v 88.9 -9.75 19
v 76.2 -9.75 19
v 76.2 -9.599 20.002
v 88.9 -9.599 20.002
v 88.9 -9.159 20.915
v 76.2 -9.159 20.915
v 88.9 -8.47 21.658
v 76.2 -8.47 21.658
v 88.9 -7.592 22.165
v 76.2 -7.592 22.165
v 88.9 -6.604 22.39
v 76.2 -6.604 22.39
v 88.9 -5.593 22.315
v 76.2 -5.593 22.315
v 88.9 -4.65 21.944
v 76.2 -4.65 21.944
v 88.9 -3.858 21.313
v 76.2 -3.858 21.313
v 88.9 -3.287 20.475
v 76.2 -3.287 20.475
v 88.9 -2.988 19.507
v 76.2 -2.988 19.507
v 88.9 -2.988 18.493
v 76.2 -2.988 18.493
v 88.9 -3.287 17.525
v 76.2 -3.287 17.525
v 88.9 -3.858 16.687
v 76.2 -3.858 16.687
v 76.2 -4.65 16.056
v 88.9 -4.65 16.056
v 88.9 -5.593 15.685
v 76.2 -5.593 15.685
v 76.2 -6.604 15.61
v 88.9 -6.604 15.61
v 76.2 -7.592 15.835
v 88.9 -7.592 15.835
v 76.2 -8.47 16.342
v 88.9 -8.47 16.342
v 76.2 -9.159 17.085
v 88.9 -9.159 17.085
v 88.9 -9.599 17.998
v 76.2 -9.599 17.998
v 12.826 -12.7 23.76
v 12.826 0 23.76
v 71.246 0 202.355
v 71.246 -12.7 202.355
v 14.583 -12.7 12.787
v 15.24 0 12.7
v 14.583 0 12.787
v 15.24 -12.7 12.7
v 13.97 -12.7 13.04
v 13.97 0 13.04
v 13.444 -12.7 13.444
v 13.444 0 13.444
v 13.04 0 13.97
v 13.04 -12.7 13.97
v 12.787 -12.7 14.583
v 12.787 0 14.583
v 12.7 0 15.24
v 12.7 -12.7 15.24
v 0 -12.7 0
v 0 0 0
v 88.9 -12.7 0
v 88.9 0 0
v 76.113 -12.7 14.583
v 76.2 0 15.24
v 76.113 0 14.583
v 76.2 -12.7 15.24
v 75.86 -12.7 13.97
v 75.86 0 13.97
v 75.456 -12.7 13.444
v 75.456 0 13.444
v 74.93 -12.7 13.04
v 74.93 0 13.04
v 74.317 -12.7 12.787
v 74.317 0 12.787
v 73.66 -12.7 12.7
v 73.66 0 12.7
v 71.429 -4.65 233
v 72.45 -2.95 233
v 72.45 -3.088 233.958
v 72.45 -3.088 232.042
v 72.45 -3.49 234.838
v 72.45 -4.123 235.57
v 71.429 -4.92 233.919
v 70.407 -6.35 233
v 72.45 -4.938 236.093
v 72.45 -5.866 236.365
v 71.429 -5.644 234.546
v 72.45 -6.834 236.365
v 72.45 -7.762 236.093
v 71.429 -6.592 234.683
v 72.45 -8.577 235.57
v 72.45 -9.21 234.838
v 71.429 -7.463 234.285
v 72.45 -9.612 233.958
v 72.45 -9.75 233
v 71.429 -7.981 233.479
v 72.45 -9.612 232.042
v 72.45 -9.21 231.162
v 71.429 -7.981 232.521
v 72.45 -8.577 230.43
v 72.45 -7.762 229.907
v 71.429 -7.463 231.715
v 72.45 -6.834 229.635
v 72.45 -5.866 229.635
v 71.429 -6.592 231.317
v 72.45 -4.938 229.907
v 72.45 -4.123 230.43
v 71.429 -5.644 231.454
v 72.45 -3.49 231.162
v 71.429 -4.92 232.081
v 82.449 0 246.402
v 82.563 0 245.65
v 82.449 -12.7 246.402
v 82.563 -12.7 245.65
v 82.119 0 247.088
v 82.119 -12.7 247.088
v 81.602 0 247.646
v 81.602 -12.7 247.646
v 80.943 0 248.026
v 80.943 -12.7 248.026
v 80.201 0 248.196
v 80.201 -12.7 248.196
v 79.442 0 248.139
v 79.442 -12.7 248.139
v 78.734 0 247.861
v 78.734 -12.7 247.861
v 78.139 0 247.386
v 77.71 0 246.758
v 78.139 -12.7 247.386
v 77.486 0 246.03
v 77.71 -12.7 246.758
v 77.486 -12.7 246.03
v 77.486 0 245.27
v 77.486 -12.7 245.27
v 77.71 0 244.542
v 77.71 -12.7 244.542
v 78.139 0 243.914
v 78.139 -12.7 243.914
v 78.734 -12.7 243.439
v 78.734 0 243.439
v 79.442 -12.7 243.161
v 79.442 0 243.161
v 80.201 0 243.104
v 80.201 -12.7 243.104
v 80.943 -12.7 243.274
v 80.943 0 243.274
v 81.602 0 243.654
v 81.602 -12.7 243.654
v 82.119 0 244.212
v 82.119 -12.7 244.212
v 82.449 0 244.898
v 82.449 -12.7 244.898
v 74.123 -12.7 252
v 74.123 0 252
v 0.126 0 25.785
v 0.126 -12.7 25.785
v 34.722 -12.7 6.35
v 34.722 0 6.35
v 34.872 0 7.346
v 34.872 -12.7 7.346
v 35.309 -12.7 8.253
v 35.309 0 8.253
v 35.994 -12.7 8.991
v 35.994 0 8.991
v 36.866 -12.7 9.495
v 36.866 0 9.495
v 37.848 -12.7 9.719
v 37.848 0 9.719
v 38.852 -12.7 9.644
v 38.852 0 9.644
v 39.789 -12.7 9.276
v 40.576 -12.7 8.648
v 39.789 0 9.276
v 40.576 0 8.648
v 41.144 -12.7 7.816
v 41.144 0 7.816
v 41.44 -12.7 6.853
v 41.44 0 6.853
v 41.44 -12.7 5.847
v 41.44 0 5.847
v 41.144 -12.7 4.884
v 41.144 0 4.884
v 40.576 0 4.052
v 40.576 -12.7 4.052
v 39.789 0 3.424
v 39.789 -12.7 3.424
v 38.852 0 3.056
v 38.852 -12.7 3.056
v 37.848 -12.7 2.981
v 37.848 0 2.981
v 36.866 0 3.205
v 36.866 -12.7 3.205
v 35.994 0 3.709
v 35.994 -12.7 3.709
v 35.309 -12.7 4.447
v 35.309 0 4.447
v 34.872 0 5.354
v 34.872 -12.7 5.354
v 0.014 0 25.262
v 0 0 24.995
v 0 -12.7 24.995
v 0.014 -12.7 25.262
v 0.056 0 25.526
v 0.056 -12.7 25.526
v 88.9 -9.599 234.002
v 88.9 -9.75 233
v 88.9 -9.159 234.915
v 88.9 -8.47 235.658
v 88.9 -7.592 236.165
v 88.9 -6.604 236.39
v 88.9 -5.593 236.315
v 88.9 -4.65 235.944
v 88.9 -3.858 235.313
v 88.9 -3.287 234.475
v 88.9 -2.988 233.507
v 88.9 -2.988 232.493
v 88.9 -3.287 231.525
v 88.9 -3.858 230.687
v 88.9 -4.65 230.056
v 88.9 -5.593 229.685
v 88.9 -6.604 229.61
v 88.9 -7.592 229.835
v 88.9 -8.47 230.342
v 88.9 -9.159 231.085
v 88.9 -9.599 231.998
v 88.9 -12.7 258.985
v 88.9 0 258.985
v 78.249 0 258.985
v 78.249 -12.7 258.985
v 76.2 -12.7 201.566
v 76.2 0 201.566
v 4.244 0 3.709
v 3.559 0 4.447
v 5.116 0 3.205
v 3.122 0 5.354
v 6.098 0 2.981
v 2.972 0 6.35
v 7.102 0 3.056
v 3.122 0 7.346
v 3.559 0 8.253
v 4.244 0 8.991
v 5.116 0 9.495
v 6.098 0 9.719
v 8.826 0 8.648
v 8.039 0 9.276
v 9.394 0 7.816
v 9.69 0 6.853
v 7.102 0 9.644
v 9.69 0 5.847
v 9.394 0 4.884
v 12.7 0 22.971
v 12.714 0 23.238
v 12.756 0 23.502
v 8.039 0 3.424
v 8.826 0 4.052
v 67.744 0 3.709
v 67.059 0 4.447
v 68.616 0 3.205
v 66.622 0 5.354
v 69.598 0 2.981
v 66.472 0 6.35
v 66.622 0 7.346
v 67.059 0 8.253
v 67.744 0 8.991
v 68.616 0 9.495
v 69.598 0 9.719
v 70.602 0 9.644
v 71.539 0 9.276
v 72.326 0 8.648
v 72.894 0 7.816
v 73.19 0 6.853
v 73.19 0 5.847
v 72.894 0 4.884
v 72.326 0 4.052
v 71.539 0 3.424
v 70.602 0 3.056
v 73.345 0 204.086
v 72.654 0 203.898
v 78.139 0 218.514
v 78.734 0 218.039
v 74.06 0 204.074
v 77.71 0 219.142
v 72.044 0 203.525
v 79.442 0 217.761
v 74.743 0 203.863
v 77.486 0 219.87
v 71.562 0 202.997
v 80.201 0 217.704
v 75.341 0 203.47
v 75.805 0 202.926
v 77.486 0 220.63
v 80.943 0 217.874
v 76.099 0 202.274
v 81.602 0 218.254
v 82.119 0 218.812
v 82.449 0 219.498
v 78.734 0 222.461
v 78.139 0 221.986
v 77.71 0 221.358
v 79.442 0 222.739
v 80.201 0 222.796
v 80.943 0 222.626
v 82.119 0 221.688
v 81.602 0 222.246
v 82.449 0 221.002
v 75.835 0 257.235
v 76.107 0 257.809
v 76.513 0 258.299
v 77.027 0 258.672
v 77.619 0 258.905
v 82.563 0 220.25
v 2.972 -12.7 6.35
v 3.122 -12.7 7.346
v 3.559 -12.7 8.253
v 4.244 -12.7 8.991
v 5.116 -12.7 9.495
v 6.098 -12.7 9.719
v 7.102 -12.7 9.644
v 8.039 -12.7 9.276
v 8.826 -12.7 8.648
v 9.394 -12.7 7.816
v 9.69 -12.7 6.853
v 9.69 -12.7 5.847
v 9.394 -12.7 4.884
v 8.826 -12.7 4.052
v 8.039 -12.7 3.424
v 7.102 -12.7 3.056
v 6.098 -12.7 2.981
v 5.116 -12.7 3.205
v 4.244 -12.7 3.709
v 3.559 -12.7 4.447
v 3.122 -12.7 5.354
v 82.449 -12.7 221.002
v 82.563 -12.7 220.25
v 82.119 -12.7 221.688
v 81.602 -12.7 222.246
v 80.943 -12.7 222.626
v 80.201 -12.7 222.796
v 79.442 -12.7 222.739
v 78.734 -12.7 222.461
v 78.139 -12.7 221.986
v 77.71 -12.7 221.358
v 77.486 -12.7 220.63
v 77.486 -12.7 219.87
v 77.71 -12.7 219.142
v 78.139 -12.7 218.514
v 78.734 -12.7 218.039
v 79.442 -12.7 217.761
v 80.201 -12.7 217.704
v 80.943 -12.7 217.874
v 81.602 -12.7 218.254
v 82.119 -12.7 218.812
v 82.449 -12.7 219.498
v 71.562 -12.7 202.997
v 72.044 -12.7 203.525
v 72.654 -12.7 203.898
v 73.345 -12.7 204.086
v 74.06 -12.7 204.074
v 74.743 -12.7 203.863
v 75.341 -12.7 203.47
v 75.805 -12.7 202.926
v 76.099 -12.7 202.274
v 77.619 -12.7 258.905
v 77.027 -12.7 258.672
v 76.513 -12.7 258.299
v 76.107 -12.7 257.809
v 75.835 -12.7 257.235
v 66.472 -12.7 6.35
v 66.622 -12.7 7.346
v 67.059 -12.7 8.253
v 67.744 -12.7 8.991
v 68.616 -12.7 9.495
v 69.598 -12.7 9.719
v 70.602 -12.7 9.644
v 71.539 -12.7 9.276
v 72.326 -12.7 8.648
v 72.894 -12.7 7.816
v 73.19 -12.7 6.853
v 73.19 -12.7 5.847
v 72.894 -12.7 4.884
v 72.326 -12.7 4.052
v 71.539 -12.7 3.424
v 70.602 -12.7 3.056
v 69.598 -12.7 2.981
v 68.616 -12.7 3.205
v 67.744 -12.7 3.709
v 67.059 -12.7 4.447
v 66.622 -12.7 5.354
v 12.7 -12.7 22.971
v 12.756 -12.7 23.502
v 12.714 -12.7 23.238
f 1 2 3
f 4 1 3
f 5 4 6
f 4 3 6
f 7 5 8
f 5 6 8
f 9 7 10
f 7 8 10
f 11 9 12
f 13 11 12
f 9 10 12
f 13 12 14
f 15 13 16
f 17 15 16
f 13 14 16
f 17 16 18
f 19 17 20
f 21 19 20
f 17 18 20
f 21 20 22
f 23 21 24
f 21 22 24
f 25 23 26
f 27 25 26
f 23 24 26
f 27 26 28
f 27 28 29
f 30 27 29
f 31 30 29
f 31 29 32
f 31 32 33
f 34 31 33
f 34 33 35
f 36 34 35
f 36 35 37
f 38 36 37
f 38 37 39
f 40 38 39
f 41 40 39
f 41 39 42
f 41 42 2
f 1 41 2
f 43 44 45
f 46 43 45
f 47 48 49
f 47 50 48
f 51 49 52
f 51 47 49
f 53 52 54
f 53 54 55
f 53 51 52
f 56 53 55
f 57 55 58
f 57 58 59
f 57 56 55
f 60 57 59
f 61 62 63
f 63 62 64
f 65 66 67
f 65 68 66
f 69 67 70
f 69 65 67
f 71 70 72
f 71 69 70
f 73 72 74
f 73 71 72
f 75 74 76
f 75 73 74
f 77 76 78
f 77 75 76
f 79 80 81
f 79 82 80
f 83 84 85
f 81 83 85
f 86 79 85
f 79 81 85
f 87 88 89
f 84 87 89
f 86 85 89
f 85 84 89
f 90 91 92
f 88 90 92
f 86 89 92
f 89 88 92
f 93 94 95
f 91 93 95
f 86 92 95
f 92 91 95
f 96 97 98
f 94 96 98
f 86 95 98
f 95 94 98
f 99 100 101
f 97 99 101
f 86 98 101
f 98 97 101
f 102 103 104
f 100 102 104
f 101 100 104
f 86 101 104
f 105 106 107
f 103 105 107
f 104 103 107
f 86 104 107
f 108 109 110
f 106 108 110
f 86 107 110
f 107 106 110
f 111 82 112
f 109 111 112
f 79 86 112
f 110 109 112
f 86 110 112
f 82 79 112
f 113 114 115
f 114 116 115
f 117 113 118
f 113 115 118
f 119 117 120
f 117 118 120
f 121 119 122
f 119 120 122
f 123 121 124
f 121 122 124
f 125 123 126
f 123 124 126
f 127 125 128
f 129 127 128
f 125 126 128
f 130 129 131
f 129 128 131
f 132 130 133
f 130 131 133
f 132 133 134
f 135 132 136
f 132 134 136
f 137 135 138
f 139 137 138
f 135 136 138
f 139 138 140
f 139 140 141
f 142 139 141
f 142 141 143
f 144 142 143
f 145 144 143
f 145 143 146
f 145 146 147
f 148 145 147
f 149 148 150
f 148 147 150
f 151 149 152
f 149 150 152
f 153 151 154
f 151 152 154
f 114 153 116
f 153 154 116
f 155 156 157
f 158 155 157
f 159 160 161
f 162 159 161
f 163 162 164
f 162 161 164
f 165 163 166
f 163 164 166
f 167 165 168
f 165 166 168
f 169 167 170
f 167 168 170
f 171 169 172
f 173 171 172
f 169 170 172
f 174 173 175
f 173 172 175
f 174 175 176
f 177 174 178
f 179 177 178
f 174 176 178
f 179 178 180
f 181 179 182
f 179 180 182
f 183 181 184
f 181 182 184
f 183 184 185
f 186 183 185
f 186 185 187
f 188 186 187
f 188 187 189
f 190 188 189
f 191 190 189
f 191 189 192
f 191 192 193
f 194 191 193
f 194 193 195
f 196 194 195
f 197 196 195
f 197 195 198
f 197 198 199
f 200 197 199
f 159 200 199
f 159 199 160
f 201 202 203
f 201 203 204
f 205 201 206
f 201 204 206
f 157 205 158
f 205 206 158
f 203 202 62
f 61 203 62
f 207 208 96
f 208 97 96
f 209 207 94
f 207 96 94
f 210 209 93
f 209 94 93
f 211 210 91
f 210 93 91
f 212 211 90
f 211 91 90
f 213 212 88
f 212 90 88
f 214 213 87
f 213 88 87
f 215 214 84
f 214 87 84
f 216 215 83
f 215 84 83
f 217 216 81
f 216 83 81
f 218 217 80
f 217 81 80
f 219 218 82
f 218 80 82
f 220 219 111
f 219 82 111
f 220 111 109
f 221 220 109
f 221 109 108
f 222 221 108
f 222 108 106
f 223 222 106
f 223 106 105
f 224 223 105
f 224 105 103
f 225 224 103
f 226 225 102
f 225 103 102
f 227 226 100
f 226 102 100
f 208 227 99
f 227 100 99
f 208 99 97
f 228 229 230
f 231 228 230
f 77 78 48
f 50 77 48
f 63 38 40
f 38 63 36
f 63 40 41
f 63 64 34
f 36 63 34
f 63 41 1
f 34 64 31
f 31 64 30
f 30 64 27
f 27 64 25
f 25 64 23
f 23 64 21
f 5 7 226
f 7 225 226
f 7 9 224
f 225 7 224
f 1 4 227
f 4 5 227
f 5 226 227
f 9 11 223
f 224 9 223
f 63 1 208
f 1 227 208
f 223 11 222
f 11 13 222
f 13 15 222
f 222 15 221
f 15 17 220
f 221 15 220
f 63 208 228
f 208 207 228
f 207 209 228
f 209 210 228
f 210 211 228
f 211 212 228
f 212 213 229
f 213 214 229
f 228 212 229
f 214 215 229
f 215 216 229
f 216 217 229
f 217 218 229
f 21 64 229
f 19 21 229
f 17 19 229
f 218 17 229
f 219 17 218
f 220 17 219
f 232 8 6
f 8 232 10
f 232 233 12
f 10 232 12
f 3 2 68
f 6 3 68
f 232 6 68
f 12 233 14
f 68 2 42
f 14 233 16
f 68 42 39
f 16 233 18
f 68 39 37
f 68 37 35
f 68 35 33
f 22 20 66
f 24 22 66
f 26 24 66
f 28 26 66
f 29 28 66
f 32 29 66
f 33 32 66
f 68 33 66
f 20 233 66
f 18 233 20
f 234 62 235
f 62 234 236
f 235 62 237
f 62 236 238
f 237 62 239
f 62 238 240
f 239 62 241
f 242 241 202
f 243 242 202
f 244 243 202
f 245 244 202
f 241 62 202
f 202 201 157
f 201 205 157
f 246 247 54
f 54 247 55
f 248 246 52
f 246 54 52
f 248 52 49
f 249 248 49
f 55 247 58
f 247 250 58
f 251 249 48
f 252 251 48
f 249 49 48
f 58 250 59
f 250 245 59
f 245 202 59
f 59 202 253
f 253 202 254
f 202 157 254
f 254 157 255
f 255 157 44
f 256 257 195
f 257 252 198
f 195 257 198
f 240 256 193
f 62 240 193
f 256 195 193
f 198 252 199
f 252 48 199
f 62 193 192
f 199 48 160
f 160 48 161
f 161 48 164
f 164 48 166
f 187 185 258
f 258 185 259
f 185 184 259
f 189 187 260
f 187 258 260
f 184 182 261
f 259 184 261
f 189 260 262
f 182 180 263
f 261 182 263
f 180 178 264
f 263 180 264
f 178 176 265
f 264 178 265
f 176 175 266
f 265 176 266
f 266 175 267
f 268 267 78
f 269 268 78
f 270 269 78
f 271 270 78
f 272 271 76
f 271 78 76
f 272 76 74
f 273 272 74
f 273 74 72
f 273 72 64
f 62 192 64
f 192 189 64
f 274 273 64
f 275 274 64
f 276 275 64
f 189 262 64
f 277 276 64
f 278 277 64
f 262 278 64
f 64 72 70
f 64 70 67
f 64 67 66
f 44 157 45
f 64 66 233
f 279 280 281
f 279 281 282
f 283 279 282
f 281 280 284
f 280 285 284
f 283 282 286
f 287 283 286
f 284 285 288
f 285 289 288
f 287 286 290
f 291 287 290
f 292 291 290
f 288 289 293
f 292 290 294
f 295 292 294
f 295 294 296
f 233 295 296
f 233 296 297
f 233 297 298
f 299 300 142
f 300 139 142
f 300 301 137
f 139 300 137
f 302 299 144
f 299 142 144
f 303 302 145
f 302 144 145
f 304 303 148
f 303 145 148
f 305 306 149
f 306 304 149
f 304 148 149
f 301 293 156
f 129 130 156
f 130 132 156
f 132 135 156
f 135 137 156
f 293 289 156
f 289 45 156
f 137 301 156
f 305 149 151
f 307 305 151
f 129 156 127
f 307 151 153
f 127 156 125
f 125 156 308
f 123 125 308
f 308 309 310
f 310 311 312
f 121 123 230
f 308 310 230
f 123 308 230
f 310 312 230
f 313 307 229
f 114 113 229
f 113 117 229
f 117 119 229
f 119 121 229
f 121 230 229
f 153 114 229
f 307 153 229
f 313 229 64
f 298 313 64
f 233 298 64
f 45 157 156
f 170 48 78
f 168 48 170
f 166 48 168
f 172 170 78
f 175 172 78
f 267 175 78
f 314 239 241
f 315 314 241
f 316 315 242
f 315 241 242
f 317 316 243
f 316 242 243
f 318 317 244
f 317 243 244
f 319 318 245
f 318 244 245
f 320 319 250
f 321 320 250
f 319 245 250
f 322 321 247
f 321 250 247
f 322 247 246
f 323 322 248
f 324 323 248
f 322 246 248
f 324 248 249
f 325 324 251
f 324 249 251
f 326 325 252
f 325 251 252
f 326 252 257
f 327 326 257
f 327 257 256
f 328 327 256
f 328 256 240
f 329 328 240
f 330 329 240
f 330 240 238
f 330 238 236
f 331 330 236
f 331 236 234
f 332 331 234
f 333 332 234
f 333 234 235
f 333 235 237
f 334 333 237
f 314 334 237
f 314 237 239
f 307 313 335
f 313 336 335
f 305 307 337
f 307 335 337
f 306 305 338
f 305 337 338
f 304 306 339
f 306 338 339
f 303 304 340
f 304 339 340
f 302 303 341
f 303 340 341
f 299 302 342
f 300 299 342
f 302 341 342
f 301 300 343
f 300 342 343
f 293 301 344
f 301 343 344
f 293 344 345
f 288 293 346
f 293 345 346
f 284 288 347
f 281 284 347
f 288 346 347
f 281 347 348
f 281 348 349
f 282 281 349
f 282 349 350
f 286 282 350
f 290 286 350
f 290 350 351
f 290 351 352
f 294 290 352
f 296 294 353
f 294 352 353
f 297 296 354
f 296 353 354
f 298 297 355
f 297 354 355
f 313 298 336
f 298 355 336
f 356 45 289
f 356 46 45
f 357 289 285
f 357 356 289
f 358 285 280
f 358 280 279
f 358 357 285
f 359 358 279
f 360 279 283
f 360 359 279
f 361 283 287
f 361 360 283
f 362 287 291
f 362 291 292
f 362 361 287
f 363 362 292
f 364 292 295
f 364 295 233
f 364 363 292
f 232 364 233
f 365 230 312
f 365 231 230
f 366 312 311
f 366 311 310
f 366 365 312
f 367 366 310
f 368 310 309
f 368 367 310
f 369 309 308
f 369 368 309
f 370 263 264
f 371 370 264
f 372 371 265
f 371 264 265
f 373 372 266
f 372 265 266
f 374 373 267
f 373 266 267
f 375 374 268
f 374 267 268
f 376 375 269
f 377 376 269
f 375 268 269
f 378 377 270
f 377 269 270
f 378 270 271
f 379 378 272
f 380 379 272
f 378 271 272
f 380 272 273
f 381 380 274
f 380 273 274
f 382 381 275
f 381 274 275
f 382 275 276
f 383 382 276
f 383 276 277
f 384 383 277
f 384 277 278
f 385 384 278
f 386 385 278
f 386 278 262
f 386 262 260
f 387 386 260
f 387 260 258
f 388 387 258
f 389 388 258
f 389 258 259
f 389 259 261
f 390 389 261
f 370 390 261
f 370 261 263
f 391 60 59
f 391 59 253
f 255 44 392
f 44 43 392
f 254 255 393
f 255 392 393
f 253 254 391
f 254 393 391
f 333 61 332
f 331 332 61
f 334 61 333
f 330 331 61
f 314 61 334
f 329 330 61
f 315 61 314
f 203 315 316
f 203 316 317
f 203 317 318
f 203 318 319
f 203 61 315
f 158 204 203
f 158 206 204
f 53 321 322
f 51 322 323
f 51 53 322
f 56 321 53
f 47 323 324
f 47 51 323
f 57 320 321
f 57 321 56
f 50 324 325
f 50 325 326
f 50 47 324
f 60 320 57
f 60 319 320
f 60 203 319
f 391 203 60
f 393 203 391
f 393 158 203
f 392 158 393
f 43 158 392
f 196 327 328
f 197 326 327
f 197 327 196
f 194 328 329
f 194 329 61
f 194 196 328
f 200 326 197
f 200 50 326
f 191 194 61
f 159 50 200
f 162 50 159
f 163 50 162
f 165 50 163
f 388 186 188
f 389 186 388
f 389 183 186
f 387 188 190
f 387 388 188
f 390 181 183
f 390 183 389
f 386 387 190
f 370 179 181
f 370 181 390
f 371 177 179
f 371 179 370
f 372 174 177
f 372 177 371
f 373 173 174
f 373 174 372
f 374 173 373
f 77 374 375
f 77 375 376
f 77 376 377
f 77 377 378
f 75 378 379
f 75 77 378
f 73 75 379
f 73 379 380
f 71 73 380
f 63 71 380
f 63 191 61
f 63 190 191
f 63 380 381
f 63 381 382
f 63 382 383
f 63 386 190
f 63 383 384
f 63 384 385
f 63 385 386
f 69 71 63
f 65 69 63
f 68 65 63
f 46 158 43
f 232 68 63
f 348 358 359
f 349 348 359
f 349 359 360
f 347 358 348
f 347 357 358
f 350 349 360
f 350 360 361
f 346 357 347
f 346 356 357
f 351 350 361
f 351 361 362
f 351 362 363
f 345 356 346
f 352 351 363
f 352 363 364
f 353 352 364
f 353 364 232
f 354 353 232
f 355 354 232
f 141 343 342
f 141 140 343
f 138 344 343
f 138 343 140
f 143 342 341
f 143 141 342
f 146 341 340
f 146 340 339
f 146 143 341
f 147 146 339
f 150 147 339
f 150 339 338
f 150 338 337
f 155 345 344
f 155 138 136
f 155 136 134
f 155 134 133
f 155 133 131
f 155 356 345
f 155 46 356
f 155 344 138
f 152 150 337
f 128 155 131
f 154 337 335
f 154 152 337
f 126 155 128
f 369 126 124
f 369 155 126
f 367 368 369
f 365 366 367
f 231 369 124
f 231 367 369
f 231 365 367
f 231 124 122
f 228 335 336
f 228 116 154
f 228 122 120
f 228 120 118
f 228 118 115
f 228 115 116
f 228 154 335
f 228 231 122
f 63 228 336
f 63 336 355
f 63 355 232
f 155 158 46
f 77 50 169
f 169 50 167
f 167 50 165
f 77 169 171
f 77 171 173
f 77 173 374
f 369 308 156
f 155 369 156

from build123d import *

# Parameters (mm, degrees)
F1_DEPTH = 12.7
F2_R     = 2.54
F4_D     = 6.8
F4_DEPTH = 16.45
F4_TIP   = 2.0429261047
F6_D     = 5.1054
F6_DEPTH = 12.7
F6_TIP   = 1.5338169022
F8_D     = 6.7564


with BuildPart() as f1:
    # F0 (on Front) → F1 (new body)
    with BuildSketch(Plane.XZ):
        Polygon((0, 25.4), (0, 0), (88.9, 0), (88.9, 12.7), (88.9, 226.6), (88.9, 239.3), (88.9, 252), (74.1228589826, 252), align=None)
        Polygon((76.2, 217.5006349499), (76.2, 12.7), (12.7, 12.7), (12.7, 23.3756349499), align=None, mode=Mode.SUBTRACT)
        Polygon((76.4077141017, 258.985), (74.1228589826, 252), (88.9, 252), (88.9, 258.985), align=None)
    extrude(amount=F1_DEPTH)

    # F2
    f2_edges = [f1.edges().sort_by_distance(p)[0] for p in [
        (0, -6.35, 25.4),
        (76.2, -6.35, 12.7),
        (12.7, -6.35, 12.7),
        (12.7, -6.35, 23.375635),
        (76.2, -6.35, 217.500635),
        (76.407714, -6.35, 258.985),
    ]]
    fillet(f2_edges, radius=F2_R)

    # F4
    with Locations(Plane.YZ.offset(88.9)):
        with Locations((-6.35, 233), (-6.35, 19)):
            Hole(F4_D / 2, depth=F4_DEPTH)
            with Locations((0, 0, -(F4_DEPTH + F4_TIP / 2))):  # 118° drill point
                Cone(0, F4_D / 2, F4_TIP, mode=Mode.SUBTRACT)

    # F6
    with Locations(Plane(origin=(0, 0, 0), x_dir=(-1, 0, 0), z_dir=(0, 1, 0))):
        with Locations((-80.01, 245.65), (-80.01, 220.25)):
            Hole(F6_D / 2, depth=F6_DEPTH)
            with Locations((0, 0, -(F6_DEPTH + F6_TIP / 2))):  # 118° drill point
                Cone(0, F6_D / 2, F6_TIP, mode=Mode.SUBTRACT)

    # F8 (through all)
    with Locations(Plane.XZ.offset(12.7)):
        with Locations((6.35, 6.35), (38.1, 6.35), (69.85, 6.35)):
            Hole(F8_D / 2)


solid = f1.part
